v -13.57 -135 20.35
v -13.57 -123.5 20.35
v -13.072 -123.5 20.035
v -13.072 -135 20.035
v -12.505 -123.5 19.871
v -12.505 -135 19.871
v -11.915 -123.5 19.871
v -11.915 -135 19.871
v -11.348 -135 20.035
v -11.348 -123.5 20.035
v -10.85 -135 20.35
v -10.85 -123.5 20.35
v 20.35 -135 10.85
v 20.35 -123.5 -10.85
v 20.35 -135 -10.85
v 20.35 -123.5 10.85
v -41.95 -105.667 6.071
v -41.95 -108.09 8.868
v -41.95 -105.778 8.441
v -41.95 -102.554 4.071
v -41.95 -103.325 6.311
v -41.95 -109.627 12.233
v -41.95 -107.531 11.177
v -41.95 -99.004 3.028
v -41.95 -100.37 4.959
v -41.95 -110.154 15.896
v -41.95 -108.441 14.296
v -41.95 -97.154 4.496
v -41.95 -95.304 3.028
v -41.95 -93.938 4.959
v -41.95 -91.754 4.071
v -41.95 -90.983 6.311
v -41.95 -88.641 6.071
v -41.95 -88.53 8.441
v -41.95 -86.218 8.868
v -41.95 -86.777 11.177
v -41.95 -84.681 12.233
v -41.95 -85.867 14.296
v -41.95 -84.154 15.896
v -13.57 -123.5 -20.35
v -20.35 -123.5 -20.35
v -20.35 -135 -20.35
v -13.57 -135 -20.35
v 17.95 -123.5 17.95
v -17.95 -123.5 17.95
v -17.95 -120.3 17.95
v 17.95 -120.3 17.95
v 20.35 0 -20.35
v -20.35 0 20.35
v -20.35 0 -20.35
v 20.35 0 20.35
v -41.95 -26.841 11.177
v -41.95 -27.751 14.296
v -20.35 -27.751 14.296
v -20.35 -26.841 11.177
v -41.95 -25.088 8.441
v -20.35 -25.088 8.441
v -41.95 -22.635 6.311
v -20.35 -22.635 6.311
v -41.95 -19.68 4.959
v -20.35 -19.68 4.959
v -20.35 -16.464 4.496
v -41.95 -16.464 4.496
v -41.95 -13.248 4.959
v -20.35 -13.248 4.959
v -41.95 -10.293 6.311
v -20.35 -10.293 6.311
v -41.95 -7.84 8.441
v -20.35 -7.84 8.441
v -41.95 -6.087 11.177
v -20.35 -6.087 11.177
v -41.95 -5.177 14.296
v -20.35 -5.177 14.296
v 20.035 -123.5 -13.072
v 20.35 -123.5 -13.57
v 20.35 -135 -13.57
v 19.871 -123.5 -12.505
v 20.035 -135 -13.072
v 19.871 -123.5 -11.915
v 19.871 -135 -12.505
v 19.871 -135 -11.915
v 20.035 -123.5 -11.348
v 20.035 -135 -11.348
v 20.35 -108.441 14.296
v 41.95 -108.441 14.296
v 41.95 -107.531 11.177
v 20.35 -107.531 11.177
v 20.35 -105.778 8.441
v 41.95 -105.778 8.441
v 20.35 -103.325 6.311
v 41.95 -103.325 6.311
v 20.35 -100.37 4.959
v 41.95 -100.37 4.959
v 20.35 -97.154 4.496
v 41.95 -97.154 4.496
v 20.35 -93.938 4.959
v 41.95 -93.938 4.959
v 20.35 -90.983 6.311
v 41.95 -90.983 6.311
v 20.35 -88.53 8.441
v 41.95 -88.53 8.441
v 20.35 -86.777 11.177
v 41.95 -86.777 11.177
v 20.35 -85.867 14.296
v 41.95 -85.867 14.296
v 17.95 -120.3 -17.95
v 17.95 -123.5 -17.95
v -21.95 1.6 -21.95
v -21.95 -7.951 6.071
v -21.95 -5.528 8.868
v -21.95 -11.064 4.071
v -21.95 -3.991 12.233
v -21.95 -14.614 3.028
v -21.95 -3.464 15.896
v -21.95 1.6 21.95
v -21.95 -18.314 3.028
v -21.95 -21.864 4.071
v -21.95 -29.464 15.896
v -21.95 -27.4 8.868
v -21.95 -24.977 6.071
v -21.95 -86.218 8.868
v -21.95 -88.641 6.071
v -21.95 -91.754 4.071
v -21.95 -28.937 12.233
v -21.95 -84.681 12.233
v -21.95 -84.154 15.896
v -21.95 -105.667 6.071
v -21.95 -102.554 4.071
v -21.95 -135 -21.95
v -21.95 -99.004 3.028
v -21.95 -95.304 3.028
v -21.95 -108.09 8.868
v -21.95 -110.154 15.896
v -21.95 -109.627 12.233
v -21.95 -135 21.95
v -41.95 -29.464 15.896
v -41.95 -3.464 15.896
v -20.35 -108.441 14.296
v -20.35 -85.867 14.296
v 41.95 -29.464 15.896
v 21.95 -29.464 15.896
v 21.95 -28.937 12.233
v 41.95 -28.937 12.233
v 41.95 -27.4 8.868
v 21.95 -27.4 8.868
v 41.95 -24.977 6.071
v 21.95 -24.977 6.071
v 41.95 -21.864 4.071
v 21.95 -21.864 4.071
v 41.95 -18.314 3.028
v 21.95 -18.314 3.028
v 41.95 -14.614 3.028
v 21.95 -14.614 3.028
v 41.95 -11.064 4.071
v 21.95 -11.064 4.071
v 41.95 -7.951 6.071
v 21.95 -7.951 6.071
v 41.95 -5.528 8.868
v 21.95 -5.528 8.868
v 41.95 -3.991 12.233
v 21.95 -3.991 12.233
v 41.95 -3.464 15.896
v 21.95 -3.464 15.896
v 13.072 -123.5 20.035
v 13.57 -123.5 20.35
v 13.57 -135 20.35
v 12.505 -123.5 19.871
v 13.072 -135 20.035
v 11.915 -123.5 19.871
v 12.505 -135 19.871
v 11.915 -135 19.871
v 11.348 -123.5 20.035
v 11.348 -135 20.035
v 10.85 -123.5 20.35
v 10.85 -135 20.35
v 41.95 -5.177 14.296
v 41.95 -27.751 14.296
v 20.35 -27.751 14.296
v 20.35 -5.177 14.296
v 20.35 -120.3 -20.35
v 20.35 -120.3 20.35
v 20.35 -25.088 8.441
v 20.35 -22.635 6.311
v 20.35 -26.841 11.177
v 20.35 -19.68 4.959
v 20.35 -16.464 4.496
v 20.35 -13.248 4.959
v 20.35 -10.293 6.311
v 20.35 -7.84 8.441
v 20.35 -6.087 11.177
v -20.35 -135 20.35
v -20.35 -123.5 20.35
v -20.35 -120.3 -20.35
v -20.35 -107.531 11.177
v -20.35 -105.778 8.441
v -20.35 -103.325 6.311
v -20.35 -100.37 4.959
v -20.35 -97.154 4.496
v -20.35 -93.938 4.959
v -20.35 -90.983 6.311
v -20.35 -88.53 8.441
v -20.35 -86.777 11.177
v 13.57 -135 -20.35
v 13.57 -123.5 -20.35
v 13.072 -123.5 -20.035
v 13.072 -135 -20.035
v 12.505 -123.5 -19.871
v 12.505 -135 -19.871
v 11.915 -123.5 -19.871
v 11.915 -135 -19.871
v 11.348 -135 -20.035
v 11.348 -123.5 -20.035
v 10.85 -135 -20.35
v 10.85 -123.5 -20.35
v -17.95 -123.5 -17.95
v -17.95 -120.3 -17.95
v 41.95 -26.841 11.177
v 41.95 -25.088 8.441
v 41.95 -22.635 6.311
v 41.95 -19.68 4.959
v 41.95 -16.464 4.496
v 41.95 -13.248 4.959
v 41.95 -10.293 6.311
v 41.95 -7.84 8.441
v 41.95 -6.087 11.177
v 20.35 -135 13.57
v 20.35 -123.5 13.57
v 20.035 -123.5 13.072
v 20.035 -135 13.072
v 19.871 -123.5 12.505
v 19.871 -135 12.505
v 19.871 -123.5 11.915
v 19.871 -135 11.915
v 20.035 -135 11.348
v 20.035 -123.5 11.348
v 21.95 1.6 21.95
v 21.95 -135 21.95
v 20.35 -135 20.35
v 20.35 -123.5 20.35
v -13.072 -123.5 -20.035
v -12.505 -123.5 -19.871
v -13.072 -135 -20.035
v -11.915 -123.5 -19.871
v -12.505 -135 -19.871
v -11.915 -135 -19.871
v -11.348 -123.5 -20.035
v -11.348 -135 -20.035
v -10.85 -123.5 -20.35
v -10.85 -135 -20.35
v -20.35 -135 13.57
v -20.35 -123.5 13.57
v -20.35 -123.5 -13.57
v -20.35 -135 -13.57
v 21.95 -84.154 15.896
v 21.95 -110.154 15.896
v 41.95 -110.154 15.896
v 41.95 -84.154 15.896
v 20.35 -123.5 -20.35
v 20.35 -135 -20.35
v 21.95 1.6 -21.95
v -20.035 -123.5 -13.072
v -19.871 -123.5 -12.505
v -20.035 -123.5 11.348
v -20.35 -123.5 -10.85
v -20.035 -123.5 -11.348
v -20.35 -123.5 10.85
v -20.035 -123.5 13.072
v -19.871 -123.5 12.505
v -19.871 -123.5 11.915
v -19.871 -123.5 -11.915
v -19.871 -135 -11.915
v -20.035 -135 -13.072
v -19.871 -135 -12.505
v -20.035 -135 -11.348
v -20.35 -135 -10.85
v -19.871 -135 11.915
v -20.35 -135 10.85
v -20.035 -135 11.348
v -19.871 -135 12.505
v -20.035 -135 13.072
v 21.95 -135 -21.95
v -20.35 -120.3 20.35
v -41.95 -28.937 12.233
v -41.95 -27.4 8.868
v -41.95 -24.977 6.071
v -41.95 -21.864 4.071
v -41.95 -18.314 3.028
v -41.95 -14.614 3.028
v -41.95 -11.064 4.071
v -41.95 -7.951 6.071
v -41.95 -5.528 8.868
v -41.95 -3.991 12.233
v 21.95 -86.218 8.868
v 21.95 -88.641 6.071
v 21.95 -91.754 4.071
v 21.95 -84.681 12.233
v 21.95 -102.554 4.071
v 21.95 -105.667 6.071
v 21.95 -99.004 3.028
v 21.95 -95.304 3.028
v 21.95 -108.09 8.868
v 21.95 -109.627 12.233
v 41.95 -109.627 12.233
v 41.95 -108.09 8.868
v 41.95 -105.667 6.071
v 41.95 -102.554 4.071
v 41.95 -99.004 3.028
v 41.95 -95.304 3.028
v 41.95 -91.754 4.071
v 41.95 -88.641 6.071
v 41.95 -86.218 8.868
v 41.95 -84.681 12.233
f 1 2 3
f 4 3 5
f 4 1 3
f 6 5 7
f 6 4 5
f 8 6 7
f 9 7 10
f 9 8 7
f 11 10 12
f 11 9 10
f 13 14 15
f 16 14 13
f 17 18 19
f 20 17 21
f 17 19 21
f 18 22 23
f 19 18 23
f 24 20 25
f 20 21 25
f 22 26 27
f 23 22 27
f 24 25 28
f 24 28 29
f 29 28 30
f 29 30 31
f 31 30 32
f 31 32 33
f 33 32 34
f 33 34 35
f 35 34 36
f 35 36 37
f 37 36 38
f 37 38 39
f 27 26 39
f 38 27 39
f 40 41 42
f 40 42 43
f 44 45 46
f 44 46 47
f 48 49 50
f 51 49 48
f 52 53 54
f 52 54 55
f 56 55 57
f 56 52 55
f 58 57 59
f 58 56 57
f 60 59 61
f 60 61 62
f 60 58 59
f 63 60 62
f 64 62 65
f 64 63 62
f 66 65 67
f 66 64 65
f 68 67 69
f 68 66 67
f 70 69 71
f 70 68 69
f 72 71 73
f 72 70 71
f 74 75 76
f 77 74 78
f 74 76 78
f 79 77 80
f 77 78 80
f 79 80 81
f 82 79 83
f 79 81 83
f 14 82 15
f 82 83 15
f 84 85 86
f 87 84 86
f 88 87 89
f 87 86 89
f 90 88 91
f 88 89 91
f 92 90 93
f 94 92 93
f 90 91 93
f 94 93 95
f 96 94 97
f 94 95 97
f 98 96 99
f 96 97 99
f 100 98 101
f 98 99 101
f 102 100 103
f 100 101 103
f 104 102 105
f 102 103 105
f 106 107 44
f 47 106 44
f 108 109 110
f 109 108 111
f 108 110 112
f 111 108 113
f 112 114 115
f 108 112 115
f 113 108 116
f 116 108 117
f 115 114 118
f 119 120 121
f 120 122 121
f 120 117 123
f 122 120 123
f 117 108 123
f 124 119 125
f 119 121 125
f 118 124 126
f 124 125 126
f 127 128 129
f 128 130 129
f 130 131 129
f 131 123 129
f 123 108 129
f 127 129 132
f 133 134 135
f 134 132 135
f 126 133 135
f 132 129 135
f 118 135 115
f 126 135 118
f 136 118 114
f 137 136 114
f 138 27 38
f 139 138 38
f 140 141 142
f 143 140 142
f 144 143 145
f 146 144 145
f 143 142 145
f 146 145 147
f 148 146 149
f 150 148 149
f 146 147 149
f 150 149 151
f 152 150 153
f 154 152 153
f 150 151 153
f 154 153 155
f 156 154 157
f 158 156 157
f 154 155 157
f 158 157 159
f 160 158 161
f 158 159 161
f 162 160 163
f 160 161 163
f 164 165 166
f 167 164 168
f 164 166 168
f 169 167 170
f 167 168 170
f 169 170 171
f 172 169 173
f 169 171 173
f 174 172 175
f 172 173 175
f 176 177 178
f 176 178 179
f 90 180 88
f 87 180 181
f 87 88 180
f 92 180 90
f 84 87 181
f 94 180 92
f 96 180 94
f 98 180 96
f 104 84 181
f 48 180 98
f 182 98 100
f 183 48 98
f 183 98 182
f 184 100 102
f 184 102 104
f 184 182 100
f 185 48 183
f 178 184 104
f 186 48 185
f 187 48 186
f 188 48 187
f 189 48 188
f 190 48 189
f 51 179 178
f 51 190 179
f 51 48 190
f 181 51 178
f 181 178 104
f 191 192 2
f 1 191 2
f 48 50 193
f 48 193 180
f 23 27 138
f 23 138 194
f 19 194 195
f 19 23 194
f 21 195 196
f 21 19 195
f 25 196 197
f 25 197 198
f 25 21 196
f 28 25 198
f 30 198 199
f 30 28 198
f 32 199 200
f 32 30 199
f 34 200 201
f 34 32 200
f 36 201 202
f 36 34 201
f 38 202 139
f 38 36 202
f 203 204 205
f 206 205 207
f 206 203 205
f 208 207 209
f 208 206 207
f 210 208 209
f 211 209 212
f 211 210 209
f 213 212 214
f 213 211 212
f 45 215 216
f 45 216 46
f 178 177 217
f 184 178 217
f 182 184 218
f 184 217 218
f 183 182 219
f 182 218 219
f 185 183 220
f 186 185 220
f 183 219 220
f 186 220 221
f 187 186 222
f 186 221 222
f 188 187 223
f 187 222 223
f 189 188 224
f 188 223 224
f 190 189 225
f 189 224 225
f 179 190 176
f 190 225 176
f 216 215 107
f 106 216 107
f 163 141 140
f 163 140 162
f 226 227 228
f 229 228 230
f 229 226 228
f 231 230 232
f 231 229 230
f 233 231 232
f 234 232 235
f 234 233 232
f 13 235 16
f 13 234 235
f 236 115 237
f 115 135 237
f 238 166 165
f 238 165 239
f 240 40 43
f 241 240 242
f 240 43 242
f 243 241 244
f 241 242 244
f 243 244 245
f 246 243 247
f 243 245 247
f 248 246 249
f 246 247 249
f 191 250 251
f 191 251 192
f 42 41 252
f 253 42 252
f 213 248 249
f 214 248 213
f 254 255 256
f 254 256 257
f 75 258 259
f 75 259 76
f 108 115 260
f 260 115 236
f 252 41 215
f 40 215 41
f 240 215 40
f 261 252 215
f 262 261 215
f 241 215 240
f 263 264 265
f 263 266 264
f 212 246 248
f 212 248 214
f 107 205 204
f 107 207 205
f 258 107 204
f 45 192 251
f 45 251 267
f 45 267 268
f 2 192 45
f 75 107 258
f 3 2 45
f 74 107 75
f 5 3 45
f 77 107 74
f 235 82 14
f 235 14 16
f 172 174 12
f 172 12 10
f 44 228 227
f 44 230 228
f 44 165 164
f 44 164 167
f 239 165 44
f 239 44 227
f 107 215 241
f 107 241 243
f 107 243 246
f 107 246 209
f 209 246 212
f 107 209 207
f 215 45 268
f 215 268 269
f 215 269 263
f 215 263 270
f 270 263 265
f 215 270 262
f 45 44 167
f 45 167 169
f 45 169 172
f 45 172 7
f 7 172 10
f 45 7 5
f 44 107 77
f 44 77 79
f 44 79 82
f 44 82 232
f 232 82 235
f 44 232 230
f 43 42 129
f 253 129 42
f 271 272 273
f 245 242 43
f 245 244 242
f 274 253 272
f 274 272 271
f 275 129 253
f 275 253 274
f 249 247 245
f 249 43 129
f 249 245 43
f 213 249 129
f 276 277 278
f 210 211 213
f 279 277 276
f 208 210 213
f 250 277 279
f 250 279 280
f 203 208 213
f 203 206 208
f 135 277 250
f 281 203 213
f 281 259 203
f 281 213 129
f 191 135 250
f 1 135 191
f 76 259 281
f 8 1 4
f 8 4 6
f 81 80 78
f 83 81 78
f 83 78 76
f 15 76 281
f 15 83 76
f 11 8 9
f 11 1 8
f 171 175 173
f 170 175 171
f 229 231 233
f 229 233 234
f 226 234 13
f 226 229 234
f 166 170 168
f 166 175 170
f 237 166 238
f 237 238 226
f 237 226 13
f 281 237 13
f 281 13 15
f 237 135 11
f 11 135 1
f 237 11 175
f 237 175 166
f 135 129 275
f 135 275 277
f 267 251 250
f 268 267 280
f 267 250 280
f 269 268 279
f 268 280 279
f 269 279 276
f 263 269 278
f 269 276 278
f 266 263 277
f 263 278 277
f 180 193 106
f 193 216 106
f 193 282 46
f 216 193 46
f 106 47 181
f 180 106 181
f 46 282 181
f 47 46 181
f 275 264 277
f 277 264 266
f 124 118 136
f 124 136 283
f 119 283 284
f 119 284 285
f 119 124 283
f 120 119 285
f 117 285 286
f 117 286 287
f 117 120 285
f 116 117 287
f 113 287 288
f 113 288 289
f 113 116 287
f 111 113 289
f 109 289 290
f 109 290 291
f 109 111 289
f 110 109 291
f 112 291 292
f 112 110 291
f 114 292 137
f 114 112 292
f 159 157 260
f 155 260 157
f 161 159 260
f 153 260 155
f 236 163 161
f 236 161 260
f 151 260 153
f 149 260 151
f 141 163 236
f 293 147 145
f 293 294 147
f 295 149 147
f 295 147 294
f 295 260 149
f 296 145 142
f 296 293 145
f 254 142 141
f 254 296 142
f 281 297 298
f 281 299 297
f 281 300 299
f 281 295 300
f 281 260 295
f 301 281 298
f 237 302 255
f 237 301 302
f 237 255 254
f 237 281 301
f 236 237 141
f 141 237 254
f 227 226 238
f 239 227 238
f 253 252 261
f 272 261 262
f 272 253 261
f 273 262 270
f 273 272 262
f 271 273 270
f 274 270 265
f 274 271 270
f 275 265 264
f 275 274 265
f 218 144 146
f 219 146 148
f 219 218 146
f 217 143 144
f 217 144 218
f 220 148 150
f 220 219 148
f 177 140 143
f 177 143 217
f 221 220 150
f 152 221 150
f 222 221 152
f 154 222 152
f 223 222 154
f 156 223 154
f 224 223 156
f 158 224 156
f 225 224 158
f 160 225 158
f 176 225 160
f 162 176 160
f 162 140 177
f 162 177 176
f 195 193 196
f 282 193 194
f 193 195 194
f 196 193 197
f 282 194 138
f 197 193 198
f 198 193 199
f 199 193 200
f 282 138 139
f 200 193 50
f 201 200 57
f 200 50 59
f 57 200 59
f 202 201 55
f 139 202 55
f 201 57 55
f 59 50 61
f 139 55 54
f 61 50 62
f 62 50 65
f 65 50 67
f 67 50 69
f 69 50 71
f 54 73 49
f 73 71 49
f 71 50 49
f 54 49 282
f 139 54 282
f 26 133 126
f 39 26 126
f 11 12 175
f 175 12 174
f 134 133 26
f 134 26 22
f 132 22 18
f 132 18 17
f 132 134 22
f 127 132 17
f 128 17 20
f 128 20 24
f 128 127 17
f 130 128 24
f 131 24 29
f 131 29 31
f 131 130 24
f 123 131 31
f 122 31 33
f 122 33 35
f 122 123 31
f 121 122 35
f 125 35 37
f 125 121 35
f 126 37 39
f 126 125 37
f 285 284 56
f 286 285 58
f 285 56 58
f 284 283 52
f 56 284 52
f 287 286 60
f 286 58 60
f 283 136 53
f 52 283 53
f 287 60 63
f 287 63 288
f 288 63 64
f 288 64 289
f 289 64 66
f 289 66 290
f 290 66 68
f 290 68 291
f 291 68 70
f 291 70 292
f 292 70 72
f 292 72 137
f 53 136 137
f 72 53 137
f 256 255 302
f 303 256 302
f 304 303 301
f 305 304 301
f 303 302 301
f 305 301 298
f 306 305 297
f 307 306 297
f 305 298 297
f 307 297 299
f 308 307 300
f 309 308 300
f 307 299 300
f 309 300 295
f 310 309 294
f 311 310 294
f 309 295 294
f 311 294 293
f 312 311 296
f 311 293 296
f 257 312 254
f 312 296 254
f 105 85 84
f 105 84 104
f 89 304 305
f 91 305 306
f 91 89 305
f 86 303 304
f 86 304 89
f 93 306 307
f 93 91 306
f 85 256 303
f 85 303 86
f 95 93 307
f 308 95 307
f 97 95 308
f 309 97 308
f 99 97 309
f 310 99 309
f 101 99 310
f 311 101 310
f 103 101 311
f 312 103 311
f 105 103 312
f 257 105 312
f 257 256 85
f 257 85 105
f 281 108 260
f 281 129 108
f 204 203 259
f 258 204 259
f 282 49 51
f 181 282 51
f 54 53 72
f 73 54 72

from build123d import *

# Parameters (mm, degrees)
SKETCH_W                     = 43.9
SKETCH_H                     = 43.9
SKETCH_W_2                   = 40.7
SKETCH_H_2                   = 40.7
PAD_DEPTH                    = 135
SKETCH001_W                  = 43.9
SKETCH001_H                  = 43.9
PAD001_DEPTH                 = 1.6
PAD002_DEPTH                 = 11.5
PAD002_POLARPATTERN_2_DEPTH  = 11.5
PAD002_POLARPATTERN_3_DEPTH  = 11.5
PAD002_POLARPATTERN_4_DEPTH  = 11.5
SKETCH003_W                  = 43.9
SKETCH003_H                  = 43.9
SKETCH003_W_2                = 35.9
SKETCH003_H_2                = 35.9
PAD003_DEPTH                 = 3.2
PAD004_DEPTH                 = 20
POCKET_DEPTH                 = 21.6
PAD004_LINEARPATTERN_2_DEPTH = 20
POCKET_LINEARPATTERN_2_DEPTH = 21.6


with BuildPart() as part:
    # Sketch → Pad (new body)
    with BuildSketch(Plane.XZ):
        Rectangle(SKETCH_W, SKETCH_H)
        Rectangle(SKETCH_W_2, SKETCH_H_2, mode=Mode.SUBTRACT)
    extrude(amount=PAD_DEPTH)

    # Sketch001 → Pad001 (join)
    with BuildSketch(Plane.XZ):
        Rectangle(SKETCH001_W, SKETCH001_H)
    extrude(amount=-PAD001_DEPTH)

    # Sketch002 → Pad002 (join)
    with BuildSketch(Plane.XZ.offset(135)):
        with BuildLine():
            ThreePointArc((-14.31, 21.95), (-12.21, 19.85), (-10.11, 21.95))
            Line((-14.31, 21.95), (-10.11, 21.95))
        make_face()
    pad002 = extrude(amount=-PAD002_DEPTH)

    # Sketch002 PolarPattern 2 → Pad002 PolarPattern 2 (add)
    with BuildSketch(Plane(origin=(0, -135, 0), x_dir=(0, 0, 1), z_dir=(0, -1, 0))):
        with BuildLine():
            ThreePointArc((-14.31, 21.95), (-12.21, 19.85), (-10.11, 21.95))
            Line((-14.31, 21.95), (-10.11, 21.95))
        make_face()
    pad002_polarpattern_2 = extrude(amount=-PAD002_POLARPATTERN_2_DEPTH)

    # Sketch002 PolarPattern 3 → Pad002 PolarPattern 3 (add)
    with BuildSketch(Plane(origin=(0, -135, 0), x_dir=(-1, 0, 0), z_dir=(0, -1, 0))):
        with BuildLine():
            ThreePointArc((-14.31, 21.95), (-12.21, 19.85), (-10.11, 21.95))
            Line((-14.31, 21.95), (-10.11, 21.95))
        make_face()
    pad002_polarpattern_3 = extrude(amount=-PAD002_POLARPATTERN_3_DEPTH)

    # Sketch002 PolarPattern 4 → Pad002 PolarPattern 4 (add)
    with BuildSketch(Plane(origin=(0, -135, 0), x_dir=(0, 0, -1), z_dir=(0, -1, 0))):
        with BuildLine():
            ThreePointArc((-14.31, 21.95), (-12.21, 19.85), (-10.11, 21.95))
            Line((-14.31, 21.95), (-10.11, 21.95))
        make_face()
    pad002_polarpattern_4 = extrude(amount=-PAD002_POLARPATTERN_4_DEPTH)

    # Mirrored: Pad002, Pad002 PolarPattern 2, Pad002 PolarPattern 3, Pad002 PolarPattern 4 across Sketch002 V_Axis
    add(pad002.mirror(Plane(origin=(0, -135, 0), x_dir=(0, -1, 0), z_dir=(1, 0, 0))))
    add(pad002_polarpattern_2.mirror(Plane(origin=(0, -135, 0), x_dir=(0, -1, 0), z_dir=(1, 0, 0))))
    add(pad002_polarpattern_3.mirror(Plane(origin=(0, -135, 0), x_dir=(0, -1, 0), z_dir=(1, 0, 0))))
    add(pad002_polarpattern_4.mirror(Plane(origin=(0, -135, 0), x_dir=(0, -1, 0), z_dir=(1, 0, 0))))

    # Sketch003 → Pad003 (join)
    with BuildSketch(Plane.XZ.offset(123.5)):
        Rectangle(SKETCH003_W, SKETCH003_H)
        Rectangle(SKETCH003_W_2, SKETCH003_H_2, mode=Mode.SUBTRACT)
    extrude(amount=-PAD003_DEPTH)

    # Sketch004 → Pad004 (join)
    with BuildSketch(Plane.YZ.offset(21.95)):
        with BuildLine():
            ThreePointArc((-110.154, 15.896), (-97.154, 2.896), (-84.154, 15.896))
            Line((-110.154, 15.896), (-84.154, 15.896))
        make_face()
    pad004 = extrude(amount=PAD004_DEPTH)

    # Sketch005 → Pocket (cut)
    with BuildSketch(Plane.YZ.offset(41.95)):
        with BuildLine():
            ThreePointArc((-108.441161, 14.296), (-97.154, 4.496), (-85.866839, 14.296))
            Line((-108.441161, 14.296), (-85.866839, 14.296))
        make_face()
    pocket = extrude(amount=-POCKET_DEPTH, mode=Mode.SUBTRACT)

    # Sketch004 LinearPattern 2 → Pad004 LinearPattern 2 (add)
    with BuildSketch(Plane(origin=(21.95, 80.69, 0), x_dir=(0, 1, 0), z_dir=(1, 0, 0))):
        with BuildLine():
            ThreePointArc((-110.154, 15.896), (-97.154, 2.896), (-84.154, 15.896))
            Line((-110.154, 15.896), (-84.154, 15.896))
        make_face()
    pad004_linearpattern_2 = extrude(amount=PAD004_LINEARPATTERN_2_DEPTH)

    # Sketch005 LinearPattern 2 → Pocket LinearPattern 2 (cut)
    with BuildSketch(Plane(origin=(41.95, 80.69, 0), x_dir=(0, 1, 0), z_dir=(1, 0, 0))):
        with BuildLine():
            ThreePointArc((-108.441161, 14.296), (-97.154, 4.496), (-85.866839, 14.296))
            Line((-108.441161, 14.296), (-85.866839, 14.296))
        make_face()
    pocket_linearpattern_2 = extrude(amount=-POCKET_LINEARPATTERN_2_DEPTH, mode=Mode.SUBTRACT)

    # Mirrored001: Pad004, Pocket, Pad004 LinearPattern 2, Pocket LinearPattern 2 across YZ
    add(pad004.mirror(Plane.YZ))
    add(pocket.mirror(Plane.YZ), mode=Mode.SUBTRACT)
    add(pad004_linearpattern_2.mirror(Plane.YZ))
    add(pocket_linearpattern_2.mirror(Plane.YZ), mode=Mode.SUBTRACT)


solid = part.part
